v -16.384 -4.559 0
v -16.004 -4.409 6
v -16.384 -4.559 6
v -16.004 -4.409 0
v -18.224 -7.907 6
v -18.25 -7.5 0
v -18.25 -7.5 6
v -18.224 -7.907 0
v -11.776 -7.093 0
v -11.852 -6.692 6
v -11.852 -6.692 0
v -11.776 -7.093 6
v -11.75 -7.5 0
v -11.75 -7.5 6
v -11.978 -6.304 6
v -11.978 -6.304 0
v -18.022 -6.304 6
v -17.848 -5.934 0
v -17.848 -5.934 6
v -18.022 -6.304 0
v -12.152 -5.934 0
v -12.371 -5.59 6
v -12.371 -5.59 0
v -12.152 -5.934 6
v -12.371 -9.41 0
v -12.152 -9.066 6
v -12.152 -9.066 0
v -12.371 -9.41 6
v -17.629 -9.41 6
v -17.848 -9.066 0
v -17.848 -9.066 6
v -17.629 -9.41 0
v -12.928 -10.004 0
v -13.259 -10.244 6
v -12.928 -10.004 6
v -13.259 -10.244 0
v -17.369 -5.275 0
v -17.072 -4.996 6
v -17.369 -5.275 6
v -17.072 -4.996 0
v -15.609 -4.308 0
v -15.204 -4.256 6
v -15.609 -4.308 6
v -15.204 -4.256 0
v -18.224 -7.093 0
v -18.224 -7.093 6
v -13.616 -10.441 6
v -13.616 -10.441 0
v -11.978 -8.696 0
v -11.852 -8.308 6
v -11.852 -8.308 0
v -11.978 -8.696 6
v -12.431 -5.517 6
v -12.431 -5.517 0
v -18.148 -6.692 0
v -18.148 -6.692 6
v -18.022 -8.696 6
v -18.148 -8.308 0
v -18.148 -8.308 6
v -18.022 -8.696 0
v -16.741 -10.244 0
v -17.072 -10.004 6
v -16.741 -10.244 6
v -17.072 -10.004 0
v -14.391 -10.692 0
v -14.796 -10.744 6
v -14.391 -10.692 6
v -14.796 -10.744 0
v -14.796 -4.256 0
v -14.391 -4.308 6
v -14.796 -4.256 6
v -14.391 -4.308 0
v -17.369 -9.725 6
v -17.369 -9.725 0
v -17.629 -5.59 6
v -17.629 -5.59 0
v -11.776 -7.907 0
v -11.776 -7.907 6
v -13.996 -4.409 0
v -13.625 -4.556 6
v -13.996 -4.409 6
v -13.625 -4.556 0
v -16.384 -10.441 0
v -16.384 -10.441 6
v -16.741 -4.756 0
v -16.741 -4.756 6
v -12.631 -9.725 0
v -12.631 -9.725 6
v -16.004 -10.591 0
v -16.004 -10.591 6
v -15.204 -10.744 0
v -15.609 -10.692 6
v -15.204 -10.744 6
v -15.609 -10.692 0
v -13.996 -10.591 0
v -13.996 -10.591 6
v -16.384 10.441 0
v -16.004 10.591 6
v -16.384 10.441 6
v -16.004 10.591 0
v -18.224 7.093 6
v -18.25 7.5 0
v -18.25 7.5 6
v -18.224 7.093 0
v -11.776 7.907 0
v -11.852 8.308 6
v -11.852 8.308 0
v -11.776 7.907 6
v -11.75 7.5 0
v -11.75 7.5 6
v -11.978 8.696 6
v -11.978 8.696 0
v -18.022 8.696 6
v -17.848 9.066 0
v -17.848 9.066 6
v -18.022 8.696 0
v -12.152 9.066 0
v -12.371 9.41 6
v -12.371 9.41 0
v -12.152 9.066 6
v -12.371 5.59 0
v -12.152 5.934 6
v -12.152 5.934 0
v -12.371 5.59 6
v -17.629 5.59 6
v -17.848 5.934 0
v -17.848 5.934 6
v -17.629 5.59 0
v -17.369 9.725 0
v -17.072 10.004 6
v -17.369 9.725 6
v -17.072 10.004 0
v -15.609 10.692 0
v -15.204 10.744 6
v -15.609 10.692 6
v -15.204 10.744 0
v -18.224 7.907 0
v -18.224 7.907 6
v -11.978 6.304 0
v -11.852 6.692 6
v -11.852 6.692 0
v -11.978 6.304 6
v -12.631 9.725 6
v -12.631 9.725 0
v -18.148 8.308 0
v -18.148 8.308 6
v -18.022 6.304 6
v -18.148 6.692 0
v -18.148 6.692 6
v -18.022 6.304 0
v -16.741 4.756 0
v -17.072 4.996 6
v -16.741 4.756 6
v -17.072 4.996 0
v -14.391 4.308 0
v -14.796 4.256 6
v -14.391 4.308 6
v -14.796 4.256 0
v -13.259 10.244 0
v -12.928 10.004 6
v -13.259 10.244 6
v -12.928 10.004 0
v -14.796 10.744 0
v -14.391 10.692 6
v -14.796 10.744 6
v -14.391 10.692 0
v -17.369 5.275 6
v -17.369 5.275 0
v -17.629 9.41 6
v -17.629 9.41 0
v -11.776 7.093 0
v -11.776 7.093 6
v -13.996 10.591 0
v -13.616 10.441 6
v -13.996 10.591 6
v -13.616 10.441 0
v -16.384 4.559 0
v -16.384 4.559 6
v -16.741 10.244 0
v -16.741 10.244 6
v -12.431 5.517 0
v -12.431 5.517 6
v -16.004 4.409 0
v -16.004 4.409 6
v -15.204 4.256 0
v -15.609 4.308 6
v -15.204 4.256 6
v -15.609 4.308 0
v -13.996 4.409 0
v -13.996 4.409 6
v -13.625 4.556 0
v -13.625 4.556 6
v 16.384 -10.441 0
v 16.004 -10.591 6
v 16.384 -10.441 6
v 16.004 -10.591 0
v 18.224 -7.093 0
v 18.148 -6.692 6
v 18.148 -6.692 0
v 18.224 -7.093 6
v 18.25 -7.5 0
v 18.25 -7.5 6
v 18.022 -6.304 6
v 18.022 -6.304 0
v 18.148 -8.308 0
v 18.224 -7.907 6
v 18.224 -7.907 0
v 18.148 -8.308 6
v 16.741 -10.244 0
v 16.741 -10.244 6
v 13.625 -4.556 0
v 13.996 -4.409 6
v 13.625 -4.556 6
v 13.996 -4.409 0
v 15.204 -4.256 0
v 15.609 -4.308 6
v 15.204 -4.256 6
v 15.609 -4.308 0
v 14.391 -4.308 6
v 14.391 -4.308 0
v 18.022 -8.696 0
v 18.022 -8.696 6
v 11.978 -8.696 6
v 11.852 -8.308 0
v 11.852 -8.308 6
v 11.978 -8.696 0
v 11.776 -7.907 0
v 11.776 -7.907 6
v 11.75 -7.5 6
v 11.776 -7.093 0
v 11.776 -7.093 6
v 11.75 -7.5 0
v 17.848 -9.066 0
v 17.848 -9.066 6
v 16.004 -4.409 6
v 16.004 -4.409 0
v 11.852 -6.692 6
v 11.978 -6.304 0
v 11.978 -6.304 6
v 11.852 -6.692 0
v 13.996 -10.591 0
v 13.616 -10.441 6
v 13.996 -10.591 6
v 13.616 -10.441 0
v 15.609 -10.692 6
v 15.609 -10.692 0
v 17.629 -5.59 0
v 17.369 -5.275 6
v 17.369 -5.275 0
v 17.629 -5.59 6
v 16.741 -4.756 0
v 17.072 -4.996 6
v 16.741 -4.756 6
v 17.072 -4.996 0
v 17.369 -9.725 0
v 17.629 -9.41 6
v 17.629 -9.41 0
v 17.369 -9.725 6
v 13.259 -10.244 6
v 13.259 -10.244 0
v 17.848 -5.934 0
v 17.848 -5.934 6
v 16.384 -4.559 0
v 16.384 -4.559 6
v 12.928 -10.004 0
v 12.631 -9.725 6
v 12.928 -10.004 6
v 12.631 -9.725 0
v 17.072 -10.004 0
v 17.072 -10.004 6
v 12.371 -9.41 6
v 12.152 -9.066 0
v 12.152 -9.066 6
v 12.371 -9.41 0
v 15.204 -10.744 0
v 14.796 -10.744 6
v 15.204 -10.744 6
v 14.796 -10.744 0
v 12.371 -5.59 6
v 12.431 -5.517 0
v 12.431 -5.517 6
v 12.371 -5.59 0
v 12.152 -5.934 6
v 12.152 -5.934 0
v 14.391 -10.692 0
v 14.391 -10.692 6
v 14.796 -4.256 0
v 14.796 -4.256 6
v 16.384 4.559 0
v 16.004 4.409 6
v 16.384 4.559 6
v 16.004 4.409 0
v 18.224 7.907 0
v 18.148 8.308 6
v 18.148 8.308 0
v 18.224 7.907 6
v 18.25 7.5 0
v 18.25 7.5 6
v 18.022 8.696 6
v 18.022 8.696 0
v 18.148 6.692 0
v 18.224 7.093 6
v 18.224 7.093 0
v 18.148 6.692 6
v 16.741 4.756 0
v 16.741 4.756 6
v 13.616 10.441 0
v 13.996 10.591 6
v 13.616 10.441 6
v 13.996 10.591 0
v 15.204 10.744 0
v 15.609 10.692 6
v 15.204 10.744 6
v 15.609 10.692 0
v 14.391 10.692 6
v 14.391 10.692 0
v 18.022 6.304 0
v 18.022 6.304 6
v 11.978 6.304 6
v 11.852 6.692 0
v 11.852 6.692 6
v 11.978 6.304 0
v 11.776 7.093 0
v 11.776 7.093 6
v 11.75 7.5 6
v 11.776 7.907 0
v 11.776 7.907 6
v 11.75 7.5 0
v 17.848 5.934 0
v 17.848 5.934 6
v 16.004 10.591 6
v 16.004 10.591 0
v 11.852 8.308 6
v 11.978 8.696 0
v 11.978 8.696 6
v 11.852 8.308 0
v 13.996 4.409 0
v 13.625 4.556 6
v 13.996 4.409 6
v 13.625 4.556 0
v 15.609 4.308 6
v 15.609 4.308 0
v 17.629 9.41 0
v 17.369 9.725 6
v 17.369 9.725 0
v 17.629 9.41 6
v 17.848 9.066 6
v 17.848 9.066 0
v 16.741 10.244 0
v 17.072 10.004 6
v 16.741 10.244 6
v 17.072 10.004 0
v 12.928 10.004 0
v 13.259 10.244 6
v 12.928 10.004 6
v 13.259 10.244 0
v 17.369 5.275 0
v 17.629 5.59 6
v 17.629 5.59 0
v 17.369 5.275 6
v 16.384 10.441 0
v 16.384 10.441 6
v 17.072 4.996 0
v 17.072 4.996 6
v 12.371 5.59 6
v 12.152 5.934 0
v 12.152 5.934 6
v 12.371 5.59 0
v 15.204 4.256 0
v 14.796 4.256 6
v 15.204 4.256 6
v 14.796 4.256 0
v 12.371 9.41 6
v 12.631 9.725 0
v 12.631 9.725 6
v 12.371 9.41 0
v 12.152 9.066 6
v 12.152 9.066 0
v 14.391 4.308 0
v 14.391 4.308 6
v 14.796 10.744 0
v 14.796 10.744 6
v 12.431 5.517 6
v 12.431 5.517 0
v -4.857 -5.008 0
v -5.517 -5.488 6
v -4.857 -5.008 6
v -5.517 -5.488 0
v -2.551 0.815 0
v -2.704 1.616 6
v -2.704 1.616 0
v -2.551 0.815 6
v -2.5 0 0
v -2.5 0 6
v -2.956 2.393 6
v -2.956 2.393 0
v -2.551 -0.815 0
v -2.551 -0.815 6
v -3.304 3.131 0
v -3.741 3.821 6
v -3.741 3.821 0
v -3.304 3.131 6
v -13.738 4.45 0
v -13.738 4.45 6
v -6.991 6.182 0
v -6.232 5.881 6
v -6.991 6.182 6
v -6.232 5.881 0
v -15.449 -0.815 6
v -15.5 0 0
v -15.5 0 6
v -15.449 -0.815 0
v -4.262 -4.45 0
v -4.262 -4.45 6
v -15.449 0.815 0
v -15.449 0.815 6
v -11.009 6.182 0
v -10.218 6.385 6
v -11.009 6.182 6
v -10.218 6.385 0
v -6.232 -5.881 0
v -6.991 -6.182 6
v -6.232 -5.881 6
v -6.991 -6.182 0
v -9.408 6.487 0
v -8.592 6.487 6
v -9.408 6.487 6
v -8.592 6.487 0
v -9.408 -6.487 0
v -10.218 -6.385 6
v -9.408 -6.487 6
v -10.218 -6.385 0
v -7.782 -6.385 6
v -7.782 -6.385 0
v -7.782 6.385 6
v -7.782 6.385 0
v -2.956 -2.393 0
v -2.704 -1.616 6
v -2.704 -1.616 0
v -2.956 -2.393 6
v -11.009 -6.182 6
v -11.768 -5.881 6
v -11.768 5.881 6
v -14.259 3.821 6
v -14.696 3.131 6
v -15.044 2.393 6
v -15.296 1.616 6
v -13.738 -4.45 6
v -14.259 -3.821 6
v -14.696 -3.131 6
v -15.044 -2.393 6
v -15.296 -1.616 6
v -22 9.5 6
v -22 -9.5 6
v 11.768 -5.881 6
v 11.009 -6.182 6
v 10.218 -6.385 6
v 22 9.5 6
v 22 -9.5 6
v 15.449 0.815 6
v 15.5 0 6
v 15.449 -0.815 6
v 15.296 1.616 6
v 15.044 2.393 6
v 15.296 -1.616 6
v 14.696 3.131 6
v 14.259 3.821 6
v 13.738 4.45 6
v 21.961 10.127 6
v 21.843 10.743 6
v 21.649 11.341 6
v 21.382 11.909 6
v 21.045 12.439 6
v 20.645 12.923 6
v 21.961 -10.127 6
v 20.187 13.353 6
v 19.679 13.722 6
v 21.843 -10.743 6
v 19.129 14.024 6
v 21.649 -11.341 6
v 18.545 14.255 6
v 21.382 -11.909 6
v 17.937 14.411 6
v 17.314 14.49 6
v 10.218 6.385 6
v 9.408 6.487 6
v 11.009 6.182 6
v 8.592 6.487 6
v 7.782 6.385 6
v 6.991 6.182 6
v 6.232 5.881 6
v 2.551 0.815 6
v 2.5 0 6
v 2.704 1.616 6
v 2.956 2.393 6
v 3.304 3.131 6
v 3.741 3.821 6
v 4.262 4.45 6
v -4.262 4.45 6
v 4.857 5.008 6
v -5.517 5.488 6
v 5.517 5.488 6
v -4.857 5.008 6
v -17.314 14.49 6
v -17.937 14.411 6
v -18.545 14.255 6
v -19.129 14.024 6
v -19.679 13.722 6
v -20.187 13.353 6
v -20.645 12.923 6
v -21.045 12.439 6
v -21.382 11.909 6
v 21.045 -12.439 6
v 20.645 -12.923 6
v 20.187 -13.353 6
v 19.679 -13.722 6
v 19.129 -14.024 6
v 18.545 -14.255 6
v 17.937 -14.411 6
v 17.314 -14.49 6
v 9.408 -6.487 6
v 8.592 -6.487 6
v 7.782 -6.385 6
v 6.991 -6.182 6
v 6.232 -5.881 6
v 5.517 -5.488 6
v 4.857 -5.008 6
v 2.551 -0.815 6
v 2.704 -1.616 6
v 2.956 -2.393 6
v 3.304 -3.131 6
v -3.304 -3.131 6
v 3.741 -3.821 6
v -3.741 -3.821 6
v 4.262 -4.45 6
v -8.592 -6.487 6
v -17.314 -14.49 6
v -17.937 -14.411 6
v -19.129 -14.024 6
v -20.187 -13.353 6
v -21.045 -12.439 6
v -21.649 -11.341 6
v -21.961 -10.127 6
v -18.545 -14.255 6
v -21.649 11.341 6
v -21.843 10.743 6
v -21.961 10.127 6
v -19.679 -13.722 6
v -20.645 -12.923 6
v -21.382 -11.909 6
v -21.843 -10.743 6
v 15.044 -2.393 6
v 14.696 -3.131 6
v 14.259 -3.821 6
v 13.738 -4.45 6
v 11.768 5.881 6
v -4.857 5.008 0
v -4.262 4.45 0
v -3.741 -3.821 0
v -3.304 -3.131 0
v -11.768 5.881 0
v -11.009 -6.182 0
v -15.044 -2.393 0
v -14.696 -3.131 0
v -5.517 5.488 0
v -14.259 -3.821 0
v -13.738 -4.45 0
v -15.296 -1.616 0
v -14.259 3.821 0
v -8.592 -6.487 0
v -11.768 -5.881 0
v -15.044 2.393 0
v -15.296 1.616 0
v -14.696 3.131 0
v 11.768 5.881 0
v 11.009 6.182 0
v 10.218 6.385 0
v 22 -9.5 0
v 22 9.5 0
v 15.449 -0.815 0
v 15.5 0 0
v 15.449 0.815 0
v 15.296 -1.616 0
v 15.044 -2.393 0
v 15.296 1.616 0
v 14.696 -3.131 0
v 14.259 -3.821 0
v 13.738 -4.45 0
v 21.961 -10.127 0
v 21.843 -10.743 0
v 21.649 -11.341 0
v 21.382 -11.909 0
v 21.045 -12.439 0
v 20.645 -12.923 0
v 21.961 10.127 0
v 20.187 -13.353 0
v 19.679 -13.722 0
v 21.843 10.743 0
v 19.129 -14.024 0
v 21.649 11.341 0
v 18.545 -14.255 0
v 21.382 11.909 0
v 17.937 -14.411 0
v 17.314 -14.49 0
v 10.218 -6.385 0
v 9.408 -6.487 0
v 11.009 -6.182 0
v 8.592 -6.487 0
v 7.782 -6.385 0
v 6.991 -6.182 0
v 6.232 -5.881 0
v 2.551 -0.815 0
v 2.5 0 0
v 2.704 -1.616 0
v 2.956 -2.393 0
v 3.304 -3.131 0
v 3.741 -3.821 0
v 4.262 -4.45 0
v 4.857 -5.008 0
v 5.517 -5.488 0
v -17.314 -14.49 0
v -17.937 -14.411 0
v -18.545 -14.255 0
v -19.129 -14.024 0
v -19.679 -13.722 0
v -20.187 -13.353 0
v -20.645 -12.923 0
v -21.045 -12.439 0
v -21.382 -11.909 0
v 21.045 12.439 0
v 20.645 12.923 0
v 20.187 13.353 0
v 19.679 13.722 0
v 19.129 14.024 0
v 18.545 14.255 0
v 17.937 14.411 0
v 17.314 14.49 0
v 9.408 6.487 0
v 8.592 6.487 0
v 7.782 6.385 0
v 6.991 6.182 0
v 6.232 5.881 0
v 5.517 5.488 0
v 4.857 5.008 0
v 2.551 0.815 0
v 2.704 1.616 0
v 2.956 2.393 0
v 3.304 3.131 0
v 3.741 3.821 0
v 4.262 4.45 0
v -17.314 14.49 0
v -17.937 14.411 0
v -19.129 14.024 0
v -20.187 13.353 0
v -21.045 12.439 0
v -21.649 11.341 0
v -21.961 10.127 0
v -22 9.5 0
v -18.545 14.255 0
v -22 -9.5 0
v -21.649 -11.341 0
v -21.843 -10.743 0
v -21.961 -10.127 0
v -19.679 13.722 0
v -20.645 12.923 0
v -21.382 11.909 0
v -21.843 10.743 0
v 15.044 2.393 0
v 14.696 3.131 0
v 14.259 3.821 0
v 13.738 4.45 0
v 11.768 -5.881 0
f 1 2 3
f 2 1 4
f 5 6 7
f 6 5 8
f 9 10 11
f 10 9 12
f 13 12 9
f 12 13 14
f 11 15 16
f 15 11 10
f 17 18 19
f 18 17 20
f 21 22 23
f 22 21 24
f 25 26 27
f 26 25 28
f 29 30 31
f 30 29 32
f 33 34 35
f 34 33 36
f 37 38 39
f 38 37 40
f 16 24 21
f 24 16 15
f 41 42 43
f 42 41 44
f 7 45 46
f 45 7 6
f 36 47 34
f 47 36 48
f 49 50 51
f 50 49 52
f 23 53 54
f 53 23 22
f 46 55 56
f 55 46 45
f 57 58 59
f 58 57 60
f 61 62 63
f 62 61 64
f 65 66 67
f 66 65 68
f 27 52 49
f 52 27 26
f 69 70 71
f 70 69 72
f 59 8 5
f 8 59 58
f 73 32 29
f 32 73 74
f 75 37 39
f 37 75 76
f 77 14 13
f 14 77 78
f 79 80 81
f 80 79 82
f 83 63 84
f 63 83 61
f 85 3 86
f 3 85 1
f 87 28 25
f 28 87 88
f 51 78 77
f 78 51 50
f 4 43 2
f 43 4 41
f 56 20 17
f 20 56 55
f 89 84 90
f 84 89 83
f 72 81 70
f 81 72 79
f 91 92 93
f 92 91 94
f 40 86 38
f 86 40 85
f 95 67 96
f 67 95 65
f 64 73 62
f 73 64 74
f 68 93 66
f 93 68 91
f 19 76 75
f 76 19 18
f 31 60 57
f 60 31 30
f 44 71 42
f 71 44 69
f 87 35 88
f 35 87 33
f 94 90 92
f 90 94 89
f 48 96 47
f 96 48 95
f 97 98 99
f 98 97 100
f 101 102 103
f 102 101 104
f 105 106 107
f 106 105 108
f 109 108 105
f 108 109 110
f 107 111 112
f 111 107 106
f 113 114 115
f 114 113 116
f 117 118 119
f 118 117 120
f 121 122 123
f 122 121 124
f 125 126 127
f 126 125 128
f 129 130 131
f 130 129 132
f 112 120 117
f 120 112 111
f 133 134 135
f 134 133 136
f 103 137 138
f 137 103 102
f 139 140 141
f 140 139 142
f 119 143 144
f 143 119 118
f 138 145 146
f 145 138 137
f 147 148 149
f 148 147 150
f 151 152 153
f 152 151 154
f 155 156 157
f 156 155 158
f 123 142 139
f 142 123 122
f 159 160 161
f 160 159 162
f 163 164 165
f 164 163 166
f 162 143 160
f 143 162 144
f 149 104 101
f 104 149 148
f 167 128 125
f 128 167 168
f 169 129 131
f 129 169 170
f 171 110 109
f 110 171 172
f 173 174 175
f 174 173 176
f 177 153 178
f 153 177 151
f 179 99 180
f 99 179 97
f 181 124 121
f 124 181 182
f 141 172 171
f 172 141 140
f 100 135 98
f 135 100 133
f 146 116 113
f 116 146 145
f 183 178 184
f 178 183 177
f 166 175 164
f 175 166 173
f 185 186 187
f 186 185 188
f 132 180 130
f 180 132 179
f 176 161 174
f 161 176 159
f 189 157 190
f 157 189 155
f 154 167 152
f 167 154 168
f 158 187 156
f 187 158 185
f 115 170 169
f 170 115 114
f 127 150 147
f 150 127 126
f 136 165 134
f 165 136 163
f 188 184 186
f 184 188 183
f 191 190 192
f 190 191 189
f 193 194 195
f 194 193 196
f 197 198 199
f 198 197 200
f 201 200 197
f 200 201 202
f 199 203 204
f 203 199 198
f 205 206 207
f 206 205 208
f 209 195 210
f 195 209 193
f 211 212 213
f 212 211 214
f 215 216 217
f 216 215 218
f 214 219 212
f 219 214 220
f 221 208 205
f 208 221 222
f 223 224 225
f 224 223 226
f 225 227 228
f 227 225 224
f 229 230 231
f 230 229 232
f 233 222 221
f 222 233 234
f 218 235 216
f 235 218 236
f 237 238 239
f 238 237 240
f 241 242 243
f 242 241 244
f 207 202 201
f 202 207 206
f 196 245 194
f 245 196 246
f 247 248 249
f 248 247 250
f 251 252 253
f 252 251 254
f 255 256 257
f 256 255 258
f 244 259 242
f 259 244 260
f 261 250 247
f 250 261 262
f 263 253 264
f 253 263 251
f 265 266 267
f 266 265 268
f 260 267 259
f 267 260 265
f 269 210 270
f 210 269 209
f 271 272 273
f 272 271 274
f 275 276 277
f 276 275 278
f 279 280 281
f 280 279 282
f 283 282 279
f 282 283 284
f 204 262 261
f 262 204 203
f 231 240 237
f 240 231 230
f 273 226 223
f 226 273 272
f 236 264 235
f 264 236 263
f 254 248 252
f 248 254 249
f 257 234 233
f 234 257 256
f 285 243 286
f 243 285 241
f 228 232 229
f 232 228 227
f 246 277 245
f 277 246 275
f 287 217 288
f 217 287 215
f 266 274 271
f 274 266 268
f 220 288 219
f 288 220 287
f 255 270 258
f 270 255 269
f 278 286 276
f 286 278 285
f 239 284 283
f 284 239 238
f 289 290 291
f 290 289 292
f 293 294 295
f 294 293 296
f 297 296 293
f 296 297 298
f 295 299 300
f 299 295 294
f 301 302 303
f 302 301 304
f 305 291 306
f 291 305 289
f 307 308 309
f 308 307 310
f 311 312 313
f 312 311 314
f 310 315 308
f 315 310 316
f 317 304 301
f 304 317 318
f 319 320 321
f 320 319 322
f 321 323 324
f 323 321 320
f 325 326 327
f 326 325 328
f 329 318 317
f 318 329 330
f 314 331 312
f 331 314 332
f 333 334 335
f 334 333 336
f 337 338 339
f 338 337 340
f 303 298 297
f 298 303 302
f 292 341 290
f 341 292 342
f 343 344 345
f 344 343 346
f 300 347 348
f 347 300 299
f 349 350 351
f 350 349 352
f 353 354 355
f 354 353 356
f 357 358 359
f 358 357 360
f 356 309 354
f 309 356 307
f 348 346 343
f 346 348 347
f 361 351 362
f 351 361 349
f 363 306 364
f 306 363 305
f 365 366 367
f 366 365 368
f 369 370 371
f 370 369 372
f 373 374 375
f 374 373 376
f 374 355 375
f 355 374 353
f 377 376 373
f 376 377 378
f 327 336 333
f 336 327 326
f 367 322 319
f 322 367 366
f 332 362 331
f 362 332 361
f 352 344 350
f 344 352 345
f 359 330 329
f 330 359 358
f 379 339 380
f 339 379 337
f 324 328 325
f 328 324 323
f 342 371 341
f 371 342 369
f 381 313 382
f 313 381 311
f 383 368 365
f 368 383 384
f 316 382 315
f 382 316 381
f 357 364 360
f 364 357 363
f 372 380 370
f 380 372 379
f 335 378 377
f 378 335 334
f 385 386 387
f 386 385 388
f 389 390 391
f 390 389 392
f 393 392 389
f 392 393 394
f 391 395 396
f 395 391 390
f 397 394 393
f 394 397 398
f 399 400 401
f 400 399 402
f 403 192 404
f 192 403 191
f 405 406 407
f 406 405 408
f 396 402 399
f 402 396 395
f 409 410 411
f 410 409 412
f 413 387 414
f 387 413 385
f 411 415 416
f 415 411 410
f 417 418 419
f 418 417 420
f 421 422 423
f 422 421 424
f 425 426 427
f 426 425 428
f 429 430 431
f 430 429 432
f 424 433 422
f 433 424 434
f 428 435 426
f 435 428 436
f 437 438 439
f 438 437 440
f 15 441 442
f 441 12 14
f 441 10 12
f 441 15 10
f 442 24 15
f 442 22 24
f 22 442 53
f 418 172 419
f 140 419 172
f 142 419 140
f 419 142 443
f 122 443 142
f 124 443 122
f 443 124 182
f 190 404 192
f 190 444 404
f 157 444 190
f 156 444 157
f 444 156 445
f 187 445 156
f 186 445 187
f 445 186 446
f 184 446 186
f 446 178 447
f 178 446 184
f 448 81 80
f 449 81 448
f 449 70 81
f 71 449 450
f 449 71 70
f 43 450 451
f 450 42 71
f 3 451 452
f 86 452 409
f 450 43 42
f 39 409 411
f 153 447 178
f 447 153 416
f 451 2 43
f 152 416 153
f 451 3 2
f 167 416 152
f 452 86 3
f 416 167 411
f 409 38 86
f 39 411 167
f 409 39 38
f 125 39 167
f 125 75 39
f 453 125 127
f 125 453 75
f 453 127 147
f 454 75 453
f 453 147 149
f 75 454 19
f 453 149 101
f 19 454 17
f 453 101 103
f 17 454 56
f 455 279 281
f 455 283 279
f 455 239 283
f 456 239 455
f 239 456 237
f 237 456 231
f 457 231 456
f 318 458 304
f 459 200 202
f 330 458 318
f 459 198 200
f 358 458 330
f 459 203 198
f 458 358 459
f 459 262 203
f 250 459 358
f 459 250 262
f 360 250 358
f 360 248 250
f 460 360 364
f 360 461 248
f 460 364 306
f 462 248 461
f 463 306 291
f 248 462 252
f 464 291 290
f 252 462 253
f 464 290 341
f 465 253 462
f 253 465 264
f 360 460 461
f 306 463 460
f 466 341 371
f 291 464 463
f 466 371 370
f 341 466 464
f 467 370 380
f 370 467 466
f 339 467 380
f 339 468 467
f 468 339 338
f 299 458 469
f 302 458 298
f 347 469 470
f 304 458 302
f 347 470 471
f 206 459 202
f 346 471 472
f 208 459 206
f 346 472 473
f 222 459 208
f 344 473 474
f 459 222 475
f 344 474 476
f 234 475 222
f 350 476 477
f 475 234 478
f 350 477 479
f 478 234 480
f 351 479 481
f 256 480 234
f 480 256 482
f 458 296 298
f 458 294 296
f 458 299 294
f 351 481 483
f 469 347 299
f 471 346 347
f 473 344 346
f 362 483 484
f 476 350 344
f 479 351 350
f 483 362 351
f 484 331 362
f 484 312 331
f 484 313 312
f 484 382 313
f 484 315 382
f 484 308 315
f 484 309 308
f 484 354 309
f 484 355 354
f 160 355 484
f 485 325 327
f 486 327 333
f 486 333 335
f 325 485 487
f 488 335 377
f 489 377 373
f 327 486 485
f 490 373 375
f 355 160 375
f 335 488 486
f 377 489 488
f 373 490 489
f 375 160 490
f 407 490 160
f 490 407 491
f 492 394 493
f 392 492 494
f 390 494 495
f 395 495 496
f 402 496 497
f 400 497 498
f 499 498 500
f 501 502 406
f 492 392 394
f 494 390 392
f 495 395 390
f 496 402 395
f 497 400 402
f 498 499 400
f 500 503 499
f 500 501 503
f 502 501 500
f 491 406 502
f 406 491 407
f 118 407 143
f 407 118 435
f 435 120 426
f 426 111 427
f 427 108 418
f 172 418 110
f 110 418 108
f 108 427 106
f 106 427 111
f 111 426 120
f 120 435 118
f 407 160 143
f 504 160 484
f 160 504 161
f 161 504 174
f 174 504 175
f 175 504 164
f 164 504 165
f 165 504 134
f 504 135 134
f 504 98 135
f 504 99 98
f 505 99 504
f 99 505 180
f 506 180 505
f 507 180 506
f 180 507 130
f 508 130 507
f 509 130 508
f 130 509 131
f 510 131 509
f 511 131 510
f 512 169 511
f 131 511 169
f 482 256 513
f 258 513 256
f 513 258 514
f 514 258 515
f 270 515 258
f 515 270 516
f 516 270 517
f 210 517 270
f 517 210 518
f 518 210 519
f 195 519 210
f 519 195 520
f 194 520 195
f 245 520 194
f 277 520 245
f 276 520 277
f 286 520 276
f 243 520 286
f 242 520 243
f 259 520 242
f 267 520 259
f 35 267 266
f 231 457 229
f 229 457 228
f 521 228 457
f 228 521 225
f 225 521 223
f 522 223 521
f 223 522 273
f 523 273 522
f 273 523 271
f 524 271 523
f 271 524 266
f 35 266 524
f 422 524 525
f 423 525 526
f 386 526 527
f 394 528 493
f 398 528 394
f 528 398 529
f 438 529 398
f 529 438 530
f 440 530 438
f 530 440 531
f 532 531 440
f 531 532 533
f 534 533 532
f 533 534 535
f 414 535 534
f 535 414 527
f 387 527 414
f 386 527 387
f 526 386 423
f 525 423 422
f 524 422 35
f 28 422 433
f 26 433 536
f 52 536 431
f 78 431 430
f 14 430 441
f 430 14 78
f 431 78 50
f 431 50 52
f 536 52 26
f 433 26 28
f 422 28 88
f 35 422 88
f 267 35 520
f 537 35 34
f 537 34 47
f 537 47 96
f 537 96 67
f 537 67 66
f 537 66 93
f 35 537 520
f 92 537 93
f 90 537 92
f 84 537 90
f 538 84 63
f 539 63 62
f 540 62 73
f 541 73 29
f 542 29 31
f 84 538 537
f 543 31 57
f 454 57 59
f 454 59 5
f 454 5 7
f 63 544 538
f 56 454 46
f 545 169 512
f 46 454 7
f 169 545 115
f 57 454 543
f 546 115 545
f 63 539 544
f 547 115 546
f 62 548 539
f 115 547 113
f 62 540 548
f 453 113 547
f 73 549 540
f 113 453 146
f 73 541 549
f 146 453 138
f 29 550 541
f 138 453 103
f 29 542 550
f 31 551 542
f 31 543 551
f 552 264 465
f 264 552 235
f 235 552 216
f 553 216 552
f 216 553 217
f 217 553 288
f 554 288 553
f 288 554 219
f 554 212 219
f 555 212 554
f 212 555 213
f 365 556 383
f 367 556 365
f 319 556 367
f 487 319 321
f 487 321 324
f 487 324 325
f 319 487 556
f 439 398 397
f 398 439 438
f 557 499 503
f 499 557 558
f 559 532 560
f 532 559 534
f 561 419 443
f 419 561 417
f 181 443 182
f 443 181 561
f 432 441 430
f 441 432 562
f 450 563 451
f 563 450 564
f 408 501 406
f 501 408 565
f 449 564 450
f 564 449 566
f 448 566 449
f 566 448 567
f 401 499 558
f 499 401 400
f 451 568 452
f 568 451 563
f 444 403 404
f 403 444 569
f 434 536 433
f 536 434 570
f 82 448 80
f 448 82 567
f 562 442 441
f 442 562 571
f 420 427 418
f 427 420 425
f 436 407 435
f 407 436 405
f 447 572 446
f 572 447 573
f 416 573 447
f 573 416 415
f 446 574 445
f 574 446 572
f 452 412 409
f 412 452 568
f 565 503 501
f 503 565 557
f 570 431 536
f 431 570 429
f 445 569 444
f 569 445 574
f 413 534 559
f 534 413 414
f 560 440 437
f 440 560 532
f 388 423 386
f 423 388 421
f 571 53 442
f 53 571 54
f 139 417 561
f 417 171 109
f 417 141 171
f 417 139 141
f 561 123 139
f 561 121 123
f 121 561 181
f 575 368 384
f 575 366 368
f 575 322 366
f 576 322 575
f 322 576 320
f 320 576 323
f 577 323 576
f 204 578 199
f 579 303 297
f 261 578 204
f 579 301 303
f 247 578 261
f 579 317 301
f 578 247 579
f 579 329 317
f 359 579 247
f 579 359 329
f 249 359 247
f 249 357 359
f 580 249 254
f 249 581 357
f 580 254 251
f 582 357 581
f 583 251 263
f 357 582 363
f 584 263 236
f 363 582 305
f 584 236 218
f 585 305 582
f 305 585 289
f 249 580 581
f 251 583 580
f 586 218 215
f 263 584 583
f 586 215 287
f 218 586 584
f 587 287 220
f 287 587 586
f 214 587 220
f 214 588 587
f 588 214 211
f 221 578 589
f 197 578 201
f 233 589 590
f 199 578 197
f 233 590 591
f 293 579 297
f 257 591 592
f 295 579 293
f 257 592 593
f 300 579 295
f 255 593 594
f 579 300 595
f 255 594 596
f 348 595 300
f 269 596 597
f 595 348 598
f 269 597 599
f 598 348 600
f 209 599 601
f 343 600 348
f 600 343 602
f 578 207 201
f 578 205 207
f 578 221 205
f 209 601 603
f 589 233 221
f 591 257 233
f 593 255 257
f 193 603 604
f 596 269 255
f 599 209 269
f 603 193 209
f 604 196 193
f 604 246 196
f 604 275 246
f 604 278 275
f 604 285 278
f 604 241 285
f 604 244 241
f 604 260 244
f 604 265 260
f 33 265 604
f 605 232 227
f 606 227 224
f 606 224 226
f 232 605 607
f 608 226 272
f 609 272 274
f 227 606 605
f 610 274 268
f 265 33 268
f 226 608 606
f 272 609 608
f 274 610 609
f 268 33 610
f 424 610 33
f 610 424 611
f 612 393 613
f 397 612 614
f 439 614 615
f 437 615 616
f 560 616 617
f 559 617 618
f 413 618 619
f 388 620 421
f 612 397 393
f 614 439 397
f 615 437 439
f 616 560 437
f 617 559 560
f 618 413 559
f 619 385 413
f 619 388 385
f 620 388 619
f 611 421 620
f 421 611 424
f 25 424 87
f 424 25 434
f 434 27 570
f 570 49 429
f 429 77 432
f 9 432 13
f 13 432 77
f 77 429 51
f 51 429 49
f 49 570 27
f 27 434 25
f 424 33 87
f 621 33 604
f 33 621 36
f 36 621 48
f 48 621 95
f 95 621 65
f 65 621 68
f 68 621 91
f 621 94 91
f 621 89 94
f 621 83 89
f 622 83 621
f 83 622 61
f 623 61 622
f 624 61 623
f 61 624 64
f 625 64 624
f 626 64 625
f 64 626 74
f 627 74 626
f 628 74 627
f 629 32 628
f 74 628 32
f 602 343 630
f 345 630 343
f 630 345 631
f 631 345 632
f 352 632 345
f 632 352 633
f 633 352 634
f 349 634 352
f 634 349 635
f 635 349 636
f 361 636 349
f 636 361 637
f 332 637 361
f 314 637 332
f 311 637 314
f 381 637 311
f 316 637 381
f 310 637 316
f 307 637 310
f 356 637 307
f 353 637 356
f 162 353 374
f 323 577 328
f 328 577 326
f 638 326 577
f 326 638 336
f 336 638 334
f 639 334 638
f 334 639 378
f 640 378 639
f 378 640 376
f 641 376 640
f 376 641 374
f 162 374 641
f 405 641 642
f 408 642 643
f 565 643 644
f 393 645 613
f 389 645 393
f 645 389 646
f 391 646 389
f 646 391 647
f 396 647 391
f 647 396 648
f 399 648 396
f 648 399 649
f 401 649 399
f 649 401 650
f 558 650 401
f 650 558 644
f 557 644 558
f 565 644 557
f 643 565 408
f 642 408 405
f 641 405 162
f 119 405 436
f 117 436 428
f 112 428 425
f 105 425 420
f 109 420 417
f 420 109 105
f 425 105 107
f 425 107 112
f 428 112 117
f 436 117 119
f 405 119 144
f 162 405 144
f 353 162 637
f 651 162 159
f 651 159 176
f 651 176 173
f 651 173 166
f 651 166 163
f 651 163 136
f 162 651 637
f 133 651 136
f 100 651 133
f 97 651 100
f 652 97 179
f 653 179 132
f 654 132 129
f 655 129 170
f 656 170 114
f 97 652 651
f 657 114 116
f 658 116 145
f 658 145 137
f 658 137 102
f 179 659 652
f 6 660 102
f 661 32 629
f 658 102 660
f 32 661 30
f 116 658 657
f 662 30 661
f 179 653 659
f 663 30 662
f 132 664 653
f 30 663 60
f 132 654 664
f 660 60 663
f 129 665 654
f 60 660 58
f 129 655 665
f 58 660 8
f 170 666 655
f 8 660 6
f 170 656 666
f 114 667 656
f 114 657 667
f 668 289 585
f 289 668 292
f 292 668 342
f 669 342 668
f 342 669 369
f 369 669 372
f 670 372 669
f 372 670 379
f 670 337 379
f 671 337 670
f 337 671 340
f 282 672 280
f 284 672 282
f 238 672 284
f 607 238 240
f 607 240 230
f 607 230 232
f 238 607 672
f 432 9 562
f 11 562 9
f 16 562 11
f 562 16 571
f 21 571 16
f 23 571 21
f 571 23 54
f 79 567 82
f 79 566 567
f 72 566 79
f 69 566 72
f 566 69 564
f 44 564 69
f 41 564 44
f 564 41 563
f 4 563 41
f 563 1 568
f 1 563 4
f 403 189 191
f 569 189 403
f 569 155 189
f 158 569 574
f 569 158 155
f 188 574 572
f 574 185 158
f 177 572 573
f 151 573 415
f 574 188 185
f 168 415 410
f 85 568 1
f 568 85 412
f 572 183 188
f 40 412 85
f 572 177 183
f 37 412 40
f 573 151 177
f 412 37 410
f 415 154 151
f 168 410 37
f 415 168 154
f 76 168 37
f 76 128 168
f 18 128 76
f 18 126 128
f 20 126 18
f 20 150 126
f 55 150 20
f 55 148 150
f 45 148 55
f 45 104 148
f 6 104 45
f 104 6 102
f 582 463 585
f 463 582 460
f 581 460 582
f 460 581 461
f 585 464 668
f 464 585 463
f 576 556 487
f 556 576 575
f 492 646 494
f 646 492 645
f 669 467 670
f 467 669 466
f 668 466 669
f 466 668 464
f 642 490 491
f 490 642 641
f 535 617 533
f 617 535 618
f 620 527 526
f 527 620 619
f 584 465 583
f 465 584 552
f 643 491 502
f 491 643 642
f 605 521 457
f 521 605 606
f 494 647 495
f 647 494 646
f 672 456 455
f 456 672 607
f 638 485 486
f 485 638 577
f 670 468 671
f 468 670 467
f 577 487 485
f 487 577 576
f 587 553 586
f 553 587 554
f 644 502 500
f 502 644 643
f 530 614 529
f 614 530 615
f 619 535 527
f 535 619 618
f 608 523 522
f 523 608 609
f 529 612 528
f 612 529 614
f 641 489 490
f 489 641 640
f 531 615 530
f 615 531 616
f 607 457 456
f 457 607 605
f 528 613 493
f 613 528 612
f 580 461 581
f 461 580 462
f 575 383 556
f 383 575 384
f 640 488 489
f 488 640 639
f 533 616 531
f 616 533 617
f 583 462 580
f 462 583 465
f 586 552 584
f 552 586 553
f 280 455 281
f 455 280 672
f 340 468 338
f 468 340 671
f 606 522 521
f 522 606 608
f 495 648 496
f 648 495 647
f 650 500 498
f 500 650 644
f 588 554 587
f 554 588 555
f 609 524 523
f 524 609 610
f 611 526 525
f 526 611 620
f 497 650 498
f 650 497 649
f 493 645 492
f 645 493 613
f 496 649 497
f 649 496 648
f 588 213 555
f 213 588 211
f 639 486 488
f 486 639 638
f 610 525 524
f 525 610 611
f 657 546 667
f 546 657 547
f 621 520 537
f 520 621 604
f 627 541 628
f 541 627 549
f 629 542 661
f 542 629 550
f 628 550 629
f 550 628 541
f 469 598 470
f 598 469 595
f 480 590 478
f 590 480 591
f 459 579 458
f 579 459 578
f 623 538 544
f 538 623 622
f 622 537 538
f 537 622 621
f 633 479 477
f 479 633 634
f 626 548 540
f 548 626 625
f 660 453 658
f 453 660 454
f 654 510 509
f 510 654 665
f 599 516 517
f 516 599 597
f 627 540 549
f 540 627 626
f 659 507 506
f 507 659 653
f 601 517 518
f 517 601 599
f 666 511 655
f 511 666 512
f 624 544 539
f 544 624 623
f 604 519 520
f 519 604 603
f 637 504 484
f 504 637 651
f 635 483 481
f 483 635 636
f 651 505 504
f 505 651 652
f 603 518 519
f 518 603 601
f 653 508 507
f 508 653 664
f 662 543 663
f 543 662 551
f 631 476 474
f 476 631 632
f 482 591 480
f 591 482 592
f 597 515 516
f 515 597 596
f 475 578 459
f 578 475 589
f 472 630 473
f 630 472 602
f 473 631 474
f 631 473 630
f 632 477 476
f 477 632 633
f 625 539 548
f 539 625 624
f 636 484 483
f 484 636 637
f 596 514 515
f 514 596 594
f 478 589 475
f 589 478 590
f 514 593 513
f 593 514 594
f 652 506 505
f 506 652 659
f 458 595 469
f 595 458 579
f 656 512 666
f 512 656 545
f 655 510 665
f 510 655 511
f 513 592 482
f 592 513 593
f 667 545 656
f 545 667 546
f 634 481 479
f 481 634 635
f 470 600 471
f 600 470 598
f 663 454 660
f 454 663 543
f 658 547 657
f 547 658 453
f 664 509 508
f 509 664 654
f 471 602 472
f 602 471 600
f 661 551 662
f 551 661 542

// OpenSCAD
$fn = 50;


difference() {
	union() {
		hull() {
			translate(v = [-17.0000000000, 9.5000000000, 0]) {
				cylinder(h = 6, r = 5);
			}
			translate(v = [17.0000000000, 9.5000000000, 0]) {
				cylinder(h = 6, r = 5);
			}
			translate(v = [-17.0000000000, -9.5000000000, 0]) {
				cylinder(h = 6, r = 5);
			}
			translate(v = [17.0000000000, -9.5000000000, 0]) {
				cylinder(h = 6, r = 5);
			}
		}
	}
	union() {
		#translate(v = [-15.0000000000, -7.5000000000, -100.0000000000]) {
			cylinder(h = 200, r = 3.2500000000);
		}
		#translate(v = [-15.0000000000, 7.5000000000, -100.0000000000]) {
			cylinder(h = 200, r = 3.2500000000);
		}
		#translate(v = [15.0000000000, -7.5000000000, -100.0000000000]) {
			cylinder(h = 200, r = 3.2500000000);
		}
		#translate(v = [15.0000000000, 7.5000000000, -100.0000000000]) {
			cylinder(h = 200, r = 3.2500000000);
		}
		#translate(v = [-9.0000000000, 0, 0]) {
			cylinder(h = 6, r = 6.5000000000);
		}
		#translate(v = [9.0000000000, 0, 0]) {
			cylinder(h = 6, r = 6.5000000000);
		}
	}
}
